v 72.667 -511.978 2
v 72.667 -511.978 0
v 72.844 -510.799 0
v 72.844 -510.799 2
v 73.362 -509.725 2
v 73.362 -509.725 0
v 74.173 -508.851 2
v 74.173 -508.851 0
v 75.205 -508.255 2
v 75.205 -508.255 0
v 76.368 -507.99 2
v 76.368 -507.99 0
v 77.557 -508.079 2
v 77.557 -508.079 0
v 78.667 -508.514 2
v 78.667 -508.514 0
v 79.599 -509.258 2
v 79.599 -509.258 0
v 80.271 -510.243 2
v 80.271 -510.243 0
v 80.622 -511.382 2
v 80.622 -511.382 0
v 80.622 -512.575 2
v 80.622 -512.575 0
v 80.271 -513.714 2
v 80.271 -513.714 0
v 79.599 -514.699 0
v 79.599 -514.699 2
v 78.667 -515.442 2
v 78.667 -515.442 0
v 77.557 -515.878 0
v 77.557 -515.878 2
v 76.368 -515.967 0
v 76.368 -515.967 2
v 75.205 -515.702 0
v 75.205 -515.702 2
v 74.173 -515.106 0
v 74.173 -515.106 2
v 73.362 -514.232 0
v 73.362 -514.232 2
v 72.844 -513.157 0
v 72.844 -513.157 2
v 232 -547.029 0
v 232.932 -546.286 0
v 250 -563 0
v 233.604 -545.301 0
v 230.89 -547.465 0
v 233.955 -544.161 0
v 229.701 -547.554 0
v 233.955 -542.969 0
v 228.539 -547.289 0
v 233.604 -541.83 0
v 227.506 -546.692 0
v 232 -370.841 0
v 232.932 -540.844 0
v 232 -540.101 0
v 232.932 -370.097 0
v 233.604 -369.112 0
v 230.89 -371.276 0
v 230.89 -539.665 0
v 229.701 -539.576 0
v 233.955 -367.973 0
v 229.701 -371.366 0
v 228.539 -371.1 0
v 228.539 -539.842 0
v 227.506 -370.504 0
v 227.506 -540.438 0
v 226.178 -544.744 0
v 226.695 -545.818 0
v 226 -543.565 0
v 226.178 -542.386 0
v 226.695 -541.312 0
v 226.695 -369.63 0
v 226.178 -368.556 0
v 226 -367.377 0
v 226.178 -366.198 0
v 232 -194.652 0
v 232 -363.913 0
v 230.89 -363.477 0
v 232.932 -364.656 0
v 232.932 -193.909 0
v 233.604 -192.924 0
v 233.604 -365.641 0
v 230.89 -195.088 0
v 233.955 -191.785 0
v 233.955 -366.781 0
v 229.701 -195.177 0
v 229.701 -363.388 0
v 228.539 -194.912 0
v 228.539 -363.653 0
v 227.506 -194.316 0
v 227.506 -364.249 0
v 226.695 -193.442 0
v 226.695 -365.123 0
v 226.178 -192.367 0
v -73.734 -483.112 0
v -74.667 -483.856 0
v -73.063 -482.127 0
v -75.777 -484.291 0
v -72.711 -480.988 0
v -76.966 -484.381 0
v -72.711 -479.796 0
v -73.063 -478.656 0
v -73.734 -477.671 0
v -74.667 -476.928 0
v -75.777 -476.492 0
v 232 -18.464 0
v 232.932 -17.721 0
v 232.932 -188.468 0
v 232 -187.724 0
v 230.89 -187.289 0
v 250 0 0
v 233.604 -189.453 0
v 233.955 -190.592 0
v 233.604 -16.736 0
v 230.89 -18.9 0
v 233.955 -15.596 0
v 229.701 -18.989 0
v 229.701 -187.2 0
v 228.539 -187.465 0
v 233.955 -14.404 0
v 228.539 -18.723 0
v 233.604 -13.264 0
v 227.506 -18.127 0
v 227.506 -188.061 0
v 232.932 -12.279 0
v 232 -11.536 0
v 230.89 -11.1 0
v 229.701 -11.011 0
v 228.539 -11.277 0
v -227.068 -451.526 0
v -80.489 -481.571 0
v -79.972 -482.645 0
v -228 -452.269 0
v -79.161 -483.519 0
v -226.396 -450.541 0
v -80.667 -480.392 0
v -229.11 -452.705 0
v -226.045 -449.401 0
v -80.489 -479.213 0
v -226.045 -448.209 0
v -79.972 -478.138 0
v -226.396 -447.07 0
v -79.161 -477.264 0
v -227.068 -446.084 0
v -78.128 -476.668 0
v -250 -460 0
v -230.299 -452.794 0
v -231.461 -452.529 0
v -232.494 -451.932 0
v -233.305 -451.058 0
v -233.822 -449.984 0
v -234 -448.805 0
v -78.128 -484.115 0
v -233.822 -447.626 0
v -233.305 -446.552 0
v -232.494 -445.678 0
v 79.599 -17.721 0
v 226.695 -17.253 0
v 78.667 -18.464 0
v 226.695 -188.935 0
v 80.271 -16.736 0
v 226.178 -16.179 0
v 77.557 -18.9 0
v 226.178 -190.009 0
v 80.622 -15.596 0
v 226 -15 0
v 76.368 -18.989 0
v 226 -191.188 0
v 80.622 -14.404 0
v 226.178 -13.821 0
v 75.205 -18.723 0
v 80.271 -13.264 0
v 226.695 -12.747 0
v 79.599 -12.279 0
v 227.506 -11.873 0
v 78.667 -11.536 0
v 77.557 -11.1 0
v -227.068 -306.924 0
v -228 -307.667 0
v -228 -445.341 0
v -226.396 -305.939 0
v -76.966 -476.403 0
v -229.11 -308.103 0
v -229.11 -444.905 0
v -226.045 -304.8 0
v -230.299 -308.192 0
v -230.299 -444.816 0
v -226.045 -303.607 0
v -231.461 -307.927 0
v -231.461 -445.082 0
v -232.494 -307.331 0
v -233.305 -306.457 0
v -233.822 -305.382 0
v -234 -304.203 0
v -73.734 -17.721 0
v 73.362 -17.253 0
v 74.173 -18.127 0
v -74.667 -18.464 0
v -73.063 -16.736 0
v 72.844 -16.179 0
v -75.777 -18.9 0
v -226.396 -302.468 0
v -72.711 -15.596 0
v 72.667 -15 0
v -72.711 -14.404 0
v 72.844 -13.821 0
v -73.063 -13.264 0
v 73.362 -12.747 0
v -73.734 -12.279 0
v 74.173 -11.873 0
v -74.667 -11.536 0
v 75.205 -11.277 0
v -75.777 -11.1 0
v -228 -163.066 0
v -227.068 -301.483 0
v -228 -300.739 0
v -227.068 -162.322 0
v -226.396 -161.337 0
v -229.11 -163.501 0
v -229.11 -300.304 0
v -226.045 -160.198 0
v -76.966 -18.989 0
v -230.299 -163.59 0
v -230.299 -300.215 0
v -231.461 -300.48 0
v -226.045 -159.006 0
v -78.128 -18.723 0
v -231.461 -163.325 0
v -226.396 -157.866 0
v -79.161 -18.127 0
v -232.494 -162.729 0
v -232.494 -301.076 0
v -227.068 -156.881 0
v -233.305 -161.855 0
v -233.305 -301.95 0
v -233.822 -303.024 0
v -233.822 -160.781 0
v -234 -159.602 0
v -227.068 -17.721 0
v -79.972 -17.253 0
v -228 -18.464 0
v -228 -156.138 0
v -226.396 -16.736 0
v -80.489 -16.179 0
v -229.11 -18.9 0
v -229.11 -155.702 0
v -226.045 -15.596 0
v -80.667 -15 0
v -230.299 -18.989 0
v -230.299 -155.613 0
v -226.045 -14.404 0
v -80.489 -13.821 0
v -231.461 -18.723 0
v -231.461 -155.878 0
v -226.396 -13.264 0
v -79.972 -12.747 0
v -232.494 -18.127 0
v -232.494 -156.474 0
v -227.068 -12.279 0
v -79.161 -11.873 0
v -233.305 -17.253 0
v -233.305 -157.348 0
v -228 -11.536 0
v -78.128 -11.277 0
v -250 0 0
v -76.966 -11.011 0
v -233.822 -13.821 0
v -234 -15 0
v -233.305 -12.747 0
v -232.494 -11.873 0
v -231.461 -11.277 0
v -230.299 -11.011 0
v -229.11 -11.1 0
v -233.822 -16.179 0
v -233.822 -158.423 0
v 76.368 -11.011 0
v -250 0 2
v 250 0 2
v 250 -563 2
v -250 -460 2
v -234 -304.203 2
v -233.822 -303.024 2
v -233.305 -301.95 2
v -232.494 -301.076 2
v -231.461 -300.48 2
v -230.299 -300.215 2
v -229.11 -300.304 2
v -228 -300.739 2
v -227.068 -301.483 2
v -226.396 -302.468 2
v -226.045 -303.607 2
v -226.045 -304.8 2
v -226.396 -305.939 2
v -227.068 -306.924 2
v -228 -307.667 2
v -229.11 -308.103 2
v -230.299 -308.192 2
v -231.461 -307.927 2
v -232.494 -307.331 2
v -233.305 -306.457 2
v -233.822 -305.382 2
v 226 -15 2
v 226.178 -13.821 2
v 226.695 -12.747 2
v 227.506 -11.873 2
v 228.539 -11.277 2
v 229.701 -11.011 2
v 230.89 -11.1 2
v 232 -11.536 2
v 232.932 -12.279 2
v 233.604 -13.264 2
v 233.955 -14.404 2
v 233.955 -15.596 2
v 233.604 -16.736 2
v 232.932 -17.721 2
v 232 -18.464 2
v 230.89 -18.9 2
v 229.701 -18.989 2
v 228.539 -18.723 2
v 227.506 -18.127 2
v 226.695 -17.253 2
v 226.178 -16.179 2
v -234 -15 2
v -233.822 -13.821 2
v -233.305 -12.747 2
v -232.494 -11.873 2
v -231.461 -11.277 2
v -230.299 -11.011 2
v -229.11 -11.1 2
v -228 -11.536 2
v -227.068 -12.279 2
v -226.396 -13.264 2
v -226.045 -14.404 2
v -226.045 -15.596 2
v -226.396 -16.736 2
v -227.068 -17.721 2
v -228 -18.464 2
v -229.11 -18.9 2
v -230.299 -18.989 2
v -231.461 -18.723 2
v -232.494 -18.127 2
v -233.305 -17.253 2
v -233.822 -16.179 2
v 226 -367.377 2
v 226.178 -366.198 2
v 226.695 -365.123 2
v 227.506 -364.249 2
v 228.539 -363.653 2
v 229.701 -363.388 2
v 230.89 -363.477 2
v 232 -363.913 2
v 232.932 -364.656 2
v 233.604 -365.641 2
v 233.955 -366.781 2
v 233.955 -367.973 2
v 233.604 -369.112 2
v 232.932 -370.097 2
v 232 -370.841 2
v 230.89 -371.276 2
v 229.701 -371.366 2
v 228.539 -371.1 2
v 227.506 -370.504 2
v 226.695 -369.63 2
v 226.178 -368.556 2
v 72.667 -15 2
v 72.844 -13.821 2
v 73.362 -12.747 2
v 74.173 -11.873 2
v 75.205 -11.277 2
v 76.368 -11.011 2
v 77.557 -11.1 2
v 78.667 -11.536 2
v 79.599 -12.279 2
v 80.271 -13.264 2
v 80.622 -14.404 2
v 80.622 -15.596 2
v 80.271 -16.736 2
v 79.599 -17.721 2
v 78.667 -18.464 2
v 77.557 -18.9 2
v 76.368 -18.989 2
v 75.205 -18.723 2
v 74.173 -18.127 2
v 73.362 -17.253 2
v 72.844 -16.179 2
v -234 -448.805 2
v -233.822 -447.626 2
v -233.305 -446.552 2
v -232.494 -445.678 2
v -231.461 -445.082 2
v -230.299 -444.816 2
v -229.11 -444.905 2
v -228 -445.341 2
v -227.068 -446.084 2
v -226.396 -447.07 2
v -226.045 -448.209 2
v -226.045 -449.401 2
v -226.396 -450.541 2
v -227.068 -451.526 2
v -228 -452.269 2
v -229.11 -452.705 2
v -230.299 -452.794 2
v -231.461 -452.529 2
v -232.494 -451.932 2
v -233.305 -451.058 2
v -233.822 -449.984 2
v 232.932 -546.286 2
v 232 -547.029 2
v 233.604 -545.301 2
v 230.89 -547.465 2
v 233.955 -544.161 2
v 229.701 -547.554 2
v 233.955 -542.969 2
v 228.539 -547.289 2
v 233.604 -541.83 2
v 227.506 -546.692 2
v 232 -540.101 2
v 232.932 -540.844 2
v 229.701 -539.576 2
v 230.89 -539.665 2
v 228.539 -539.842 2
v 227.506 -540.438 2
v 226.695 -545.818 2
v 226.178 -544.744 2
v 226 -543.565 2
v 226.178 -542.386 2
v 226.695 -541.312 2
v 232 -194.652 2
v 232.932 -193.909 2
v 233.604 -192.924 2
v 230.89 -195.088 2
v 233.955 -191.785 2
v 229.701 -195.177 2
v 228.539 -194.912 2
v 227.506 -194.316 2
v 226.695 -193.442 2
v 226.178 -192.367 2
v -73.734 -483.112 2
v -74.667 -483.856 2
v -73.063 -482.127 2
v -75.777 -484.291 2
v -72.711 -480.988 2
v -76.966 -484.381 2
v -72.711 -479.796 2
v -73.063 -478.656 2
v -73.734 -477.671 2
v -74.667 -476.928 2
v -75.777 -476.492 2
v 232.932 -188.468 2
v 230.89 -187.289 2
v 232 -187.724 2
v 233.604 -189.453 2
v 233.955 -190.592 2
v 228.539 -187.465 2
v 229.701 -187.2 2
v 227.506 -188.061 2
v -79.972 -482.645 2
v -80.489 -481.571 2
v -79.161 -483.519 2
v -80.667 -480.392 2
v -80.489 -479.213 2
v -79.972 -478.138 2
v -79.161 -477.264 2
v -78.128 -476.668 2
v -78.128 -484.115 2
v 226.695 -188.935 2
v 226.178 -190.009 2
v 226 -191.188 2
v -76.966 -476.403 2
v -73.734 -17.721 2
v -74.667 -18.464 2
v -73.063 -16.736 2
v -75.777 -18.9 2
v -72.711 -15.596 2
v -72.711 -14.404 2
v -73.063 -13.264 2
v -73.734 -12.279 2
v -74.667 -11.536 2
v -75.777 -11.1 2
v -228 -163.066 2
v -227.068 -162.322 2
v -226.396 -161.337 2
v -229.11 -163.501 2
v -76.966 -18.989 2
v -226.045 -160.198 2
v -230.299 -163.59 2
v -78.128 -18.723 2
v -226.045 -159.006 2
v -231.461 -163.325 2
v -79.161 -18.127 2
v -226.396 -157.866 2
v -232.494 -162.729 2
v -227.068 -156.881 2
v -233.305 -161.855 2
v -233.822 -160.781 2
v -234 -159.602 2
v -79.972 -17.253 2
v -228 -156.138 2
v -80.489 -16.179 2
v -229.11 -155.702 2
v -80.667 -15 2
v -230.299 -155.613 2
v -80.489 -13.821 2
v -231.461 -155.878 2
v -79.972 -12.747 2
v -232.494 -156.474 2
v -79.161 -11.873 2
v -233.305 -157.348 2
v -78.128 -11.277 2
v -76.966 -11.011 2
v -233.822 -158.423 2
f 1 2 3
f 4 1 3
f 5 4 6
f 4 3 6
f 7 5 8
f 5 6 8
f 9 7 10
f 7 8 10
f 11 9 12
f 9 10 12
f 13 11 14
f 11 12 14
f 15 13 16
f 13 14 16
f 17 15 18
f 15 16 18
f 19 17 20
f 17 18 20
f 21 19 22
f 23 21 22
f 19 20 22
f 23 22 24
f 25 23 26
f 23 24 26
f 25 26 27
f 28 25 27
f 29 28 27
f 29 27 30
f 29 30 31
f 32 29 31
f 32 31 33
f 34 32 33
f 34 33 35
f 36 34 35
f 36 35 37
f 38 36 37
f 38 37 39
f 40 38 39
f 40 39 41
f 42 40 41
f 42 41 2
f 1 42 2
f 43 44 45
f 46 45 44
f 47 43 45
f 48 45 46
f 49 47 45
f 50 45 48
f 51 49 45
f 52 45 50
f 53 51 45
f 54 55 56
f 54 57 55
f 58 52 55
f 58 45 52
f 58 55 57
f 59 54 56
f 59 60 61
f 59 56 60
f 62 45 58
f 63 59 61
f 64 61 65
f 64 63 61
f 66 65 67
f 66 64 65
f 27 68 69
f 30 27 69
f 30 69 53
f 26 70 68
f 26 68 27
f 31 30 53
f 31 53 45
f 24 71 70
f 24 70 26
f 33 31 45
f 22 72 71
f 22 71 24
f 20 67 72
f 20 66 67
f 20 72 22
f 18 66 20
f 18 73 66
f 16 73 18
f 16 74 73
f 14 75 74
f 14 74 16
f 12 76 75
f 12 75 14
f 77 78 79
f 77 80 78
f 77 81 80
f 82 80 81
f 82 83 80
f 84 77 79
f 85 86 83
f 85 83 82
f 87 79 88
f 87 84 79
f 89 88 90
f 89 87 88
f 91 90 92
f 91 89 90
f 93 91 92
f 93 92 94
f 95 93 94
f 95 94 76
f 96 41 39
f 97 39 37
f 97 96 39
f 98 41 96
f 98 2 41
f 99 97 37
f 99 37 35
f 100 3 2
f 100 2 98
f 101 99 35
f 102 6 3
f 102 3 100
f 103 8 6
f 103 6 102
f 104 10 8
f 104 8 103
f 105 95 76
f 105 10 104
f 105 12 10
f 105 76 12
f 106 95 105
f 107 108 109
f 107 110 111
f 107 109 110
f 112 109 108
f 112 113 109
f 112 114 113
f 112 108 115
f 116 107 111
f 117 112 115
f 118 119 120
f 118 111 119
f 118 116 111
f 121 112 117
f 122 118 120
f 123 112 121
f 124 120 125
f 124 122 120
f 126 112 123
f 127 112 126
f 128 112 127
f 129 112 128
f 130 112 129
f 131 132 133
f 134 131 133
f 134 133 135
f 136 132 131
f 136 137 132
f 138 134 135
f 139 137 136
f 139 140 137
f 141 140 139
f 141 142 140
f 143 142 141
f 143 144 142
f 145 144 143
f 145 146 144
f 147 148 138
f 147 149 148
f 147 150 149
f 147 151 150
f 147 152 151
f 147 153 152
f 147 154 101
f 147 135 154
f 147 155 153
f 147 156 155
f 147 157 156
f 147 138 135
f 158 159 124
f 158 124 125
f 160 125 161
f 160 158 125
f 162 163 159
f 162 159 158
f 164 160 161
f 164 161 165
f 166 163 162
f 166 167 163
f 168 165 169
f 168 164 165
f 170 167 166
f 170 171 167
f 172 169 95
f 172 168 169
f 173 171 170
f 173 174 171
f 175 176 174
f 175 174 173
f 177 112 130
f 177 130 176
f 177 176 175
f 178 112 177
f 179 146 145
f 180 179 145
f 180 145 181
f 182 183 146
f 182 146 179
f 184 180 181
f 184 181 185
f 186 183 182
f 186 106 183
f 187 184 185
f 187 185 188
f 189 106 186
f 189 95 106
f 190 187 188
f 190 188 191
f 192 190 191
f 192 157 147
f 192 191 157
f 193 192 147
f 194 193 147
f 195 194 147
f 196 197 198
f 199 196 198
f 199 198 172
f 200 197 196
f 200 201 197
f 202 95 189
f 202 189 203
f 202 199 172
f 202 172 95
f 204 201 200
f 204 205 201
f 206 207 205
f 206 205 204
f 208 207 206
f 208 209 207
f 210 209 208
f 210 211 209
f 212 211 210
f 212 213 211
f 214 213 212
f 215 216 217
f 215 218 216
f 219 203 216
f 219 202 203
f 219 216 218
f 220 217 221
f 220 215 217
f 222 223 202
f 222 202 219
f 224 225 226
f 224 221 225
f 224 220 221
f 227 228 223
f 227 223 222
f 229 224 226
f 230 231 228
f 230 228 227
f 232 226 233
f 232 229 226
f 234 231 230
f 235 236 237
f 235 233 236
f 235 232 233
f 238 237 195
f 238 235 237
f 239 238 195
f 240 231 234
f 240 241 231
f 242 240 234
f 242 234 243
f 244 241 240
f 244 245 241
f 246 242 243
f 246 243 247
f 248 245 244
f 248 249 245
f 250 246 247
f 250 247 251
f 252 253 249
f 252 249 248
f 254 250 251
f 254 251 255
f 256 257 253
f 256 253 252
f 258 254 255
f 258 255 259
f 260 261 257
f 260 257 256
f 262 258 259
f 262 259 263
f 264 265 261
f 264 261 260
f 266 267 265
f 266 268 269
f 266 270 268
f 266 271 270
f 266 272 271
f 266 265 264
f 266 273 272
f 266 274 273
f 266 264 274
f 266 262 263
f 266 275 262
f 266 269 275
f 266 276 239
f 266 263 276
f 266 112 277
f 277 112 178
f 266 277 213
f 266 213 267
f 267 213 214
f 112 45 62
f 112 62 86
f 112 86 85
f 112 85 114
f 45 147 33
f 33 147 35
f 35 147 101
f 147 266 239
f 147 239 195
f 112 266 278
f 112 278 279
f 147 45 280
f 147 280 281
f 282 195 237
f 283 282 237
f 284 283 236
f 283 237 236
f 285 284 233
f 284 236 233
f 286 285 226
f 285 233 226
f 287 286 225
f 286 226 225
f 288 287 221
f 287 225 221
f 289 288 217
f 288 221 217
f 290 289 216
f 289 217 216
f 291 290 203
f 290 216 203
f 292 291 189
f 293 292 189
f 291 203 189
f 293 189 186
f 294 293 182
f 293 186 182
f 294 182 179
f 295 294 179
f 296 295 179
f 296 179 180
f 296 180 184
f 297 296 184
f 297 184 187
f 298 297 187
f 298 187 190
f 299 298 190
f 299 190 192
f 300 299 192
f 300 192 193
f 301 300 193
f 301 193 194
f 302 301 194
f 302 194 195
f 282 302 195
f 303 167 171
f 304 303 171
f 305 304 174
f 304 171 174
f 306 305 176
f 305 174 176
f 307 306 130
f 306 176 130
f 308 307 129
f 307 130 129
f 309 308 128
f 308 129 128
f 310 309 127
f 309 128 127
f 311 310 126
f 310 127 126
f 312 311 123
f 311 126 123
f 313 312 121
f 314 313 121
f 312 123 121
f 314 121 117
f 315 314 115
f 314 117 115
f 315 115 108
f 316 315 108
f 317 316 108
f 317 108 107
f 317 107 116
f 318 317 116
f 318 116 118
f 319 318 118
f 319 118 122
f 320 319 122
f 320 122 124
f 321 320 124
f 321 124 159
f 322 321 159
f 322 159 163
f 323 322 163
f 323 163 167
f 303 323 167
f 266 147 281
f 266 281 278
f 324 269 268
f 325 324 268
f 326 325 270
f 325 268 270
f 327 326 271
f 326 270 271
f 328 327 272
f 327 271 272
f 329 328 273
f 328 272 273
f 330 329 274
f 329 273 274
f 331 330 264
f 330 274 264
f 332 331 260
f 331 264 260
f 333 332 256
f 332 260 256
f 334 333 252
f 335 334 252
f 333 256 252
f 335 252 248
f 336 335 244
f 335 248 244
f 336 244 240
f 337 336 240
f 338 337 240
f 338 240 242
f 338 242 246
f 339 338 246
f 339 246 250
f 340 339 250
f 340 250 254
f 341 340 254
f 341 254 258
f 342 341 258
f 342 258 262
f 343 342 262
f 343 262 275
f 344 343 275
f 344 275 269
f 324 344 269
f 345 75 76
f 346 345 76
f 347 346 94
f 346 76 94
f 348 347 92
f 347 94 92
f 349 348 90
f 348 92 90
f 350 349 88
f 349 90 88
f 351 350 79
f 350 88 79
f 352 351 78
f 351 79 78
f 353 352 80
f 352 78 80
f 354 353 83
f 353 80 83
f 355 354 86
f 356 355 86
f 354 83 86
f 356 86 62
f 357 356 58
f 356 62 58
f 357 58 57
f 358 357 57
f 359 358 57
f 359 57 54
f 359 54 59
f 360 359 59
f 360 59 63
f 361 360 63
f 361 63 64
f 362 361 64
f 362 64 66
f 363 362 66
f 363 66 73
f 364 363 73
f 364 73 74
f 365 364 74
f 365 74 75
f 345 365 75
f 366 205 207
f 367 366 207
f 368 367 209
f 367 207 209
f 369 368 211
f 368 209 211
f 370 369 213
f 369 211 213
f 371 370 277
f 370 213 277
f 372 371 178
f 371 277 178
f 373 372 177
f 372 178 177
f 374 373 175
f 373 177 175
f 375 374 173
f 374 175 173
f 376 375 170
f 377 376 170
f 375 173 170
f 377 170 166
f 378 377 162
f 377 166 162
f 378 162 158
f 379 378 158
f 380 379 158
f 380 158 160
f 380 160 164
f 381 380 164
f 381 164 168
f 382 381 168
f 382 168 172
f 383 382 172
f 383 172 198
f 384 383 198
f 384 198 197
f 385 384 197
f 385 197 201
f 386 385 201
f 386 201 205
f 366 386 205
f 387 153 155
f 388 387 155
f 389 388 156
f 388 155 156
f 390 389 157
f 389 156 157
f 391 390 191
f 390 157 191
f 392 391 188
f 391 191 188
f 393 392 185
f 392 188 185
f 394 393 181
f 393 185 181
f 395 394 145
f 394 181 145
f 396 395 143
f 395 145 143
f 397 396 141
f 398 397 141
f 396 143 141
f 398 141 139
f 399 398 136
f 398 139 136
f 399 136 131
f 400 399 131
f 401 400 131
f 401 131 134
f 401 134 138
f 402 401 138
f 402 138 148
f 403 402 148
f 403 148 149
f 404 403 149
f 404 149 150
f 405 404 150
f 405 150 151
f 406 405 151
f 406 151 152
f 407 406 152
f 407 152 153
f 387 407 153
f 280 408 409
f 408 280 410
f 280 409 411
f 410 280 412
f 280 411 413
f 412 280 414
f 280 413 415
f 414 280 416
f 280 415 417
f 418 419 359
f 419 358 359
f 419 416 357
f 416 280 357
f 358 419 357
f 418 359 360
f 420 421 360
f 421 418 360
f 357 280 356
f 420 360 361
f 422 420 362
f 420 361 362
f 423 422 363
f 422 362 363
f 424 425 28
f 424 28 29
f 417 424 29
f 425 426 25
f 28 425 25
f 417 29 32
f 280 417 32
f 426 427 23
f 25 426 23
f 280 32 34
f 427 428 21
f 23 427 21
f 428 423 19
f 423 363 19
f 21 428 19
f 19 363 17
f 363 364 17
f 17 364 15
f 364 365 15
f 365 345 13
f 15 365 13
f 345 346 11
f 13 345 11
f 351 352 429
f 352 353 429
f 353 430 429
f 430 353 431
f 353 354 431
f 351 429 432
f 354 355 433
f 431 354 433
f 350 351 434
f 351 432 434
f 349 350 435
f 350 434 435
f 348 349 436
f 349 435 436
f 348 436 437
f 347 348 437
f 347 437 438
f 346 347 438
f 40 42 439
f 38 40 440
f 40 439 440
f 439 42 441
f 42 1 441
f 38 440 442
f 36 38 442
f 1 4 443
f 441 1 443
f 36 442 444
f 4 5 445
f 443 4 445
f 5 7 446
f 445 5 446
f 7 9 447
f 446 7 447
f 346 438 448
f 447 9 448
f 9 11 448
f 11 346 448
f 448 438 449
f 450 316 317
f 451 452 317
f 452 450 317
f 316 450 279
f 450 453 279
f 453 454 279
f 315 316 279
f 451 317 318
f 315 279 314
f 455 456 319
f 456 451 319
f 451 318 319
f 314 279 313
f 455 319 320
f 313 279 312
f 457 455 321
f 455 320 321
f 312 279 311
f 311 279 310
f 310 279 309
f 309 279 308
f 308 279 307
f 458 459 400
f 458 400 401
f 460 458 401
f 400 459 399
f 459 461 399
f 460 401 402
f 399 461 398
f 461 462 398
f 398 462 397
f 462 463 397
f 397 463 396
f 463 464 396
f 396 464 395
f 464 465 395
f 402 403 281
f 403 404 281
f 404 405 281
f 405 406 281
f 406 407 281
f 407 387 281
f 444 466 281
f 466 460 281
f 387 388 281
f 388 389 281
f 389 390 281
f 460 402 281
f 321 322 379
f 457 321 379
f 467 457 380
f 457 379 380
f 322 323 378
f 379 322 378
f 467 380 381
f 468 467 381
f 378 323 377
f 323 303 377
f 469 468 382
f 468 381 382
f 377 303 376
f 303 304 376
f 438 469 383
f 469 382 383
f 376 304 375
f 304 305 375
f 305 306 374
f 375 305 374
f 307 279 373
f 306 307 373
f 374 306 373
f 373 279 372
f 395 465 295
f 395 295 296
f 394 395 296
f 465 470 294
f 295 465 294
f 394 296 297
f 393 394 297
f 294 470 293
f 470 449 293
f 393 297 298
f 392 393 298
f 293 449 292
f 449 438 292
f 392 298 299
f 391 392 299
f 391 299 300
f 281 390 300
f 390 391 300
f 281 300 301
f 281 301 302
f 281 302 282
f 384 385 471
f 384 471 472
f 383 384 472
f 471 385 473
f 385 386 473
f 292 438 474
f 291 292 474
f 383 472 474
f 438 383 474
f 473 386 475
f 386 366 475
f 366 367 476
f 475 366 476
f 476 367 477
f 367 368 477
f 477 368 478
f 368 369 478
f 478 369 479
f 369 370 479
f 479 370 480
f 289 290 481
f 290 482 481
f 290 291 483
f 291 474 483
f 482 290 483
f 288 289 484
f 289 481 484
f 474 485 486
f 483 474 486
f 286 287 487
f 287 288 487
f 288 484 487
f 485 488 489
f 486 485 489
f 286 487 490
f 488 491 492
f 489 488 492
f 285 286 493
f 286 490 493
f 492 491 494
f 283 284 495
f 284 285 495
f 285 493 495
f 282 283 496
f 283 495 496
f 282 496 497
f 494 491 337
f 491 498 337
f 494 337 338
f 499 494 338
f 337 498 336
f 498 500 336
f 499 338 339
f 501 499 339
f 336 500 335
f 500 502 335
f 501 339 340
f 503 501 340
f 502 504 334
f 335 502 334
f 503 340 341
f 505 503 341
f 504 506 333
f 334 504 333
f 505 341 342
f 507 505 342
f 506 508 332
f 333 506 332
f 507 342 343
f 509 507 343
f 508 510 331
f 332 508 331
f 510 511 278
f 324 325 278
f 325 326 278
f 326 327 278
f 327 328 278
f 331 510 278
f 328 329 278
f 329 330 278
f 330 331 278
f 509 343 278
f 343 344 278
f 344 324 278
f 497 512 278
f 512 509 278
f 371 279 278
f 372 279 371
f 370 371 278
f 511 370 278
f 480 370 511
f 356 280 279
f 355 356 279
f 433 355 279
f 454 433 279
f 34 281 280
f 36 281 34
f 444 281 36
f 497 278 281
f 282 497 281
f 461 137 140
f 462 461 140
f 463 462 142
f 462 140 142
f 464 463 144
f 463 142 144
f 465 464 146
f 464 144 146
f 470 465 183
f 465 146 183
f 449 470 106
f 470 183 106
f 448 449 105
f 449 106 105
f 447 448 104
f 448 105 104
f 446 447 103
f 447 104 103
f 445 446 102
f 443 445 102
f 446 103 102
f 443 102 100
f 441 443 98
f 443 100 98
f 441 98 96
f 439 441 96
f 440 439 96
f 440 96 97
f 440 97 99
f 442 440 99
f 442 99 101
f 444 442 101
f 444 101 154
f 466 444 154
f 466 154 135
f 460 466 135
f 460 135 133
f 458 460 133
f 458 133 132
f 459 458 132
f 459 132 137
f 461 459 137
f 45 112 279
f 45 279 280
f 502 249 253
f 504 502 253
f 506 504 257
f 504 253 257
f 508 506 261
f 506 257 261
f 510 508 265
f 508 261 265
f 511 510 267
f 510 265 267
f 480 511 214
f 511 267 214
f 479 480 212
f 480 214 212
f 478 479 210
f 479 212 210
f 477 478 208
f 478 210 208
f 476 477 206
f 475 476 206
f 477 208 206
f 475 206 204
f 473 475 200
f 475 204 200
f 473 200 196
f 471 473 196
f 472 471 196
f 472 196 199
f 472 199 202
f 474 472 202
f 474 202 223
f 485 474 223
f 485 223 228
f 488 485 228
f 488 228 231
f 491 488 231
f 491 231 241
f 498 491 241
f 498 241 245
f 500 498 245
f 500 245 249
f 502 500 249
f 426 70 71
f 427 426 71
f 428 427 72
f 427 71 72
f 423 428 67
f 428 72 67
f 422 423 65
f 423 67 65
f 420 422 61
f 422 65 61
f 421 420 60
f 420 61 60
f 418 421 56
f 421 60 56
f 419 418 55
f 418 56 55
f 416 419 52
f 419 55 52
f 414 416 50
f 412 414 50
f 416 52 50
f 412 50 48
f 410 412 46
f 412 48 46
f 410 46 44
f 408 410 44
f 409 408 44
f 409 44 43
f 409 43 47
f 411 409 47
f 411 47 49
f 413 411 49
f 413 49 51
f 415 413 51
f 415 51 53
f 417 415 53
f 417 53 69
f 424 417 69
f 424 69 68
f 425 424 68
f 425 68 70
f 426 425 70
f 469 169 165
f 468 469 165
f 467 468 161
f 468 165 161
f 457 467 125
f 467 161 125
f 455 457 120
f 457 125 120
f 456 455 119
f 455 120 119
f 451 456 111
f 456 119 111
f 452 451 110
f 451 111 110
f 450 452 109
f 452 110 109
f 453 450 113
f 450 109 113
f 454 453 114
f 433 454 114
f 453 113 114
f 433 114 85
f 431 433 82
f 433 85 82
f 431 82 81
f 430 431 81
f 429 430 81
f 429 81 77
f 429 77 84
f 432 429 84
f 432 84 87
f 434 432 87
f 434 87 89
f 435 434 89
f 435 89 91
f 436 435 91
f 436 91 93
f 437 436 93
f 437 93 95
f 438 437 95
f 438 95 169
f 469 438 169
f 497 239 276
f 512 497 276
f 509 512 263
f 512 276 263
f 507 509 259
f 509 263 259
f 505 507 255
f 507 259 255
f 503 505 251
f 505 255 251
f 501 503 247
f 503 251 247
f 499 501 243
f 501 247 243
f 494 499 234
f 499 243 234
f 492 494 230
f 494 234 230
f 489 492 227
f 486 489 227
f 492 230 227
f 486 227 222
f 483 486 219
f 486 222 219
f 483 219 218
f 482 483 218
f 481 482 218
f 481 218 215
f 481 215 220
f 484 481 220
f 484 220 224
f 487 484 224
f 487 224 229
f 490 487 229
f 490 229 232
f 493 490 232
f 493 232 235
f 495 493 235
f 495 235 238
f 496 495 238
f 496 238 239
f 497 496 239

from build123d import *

# Parameters (mm, degrees)
BOSS_EXTRU_1_DEPTH      = 2
ESQUISSE3_R             = 4
ENL_V_MAT_EXTRU_1_DEPTH = 10


with BuildPart() as part:
    # Esquisse1 → Boss.-Extru.1 (new body)
    with BuildSketch(Plane.XY):
        Polygon((-250, 0), (250, 0), (250, -563), (-250, -460), align=None)
    extrude(amount=BOSS_EXTRU_1_DEPTH)

    # Esquisse3 → Enlèv. mat.-Extru.1 (cut)
    with BuildSketch(Plane(origin=(0, 0, 0), x_dir=(-1, 0, 0), z_dir=(0, 0, -1))):
        with Locations((-230, -15)):
            Circle(ESQUISSE3_R)
        with Locations((-76.666666667, -15)):
            Circle(ESQUISSE3_R)
        with Locations((76.666666667, -15)):
            Circle(ESQUISSE3_R)
        with Locations((230, -15)):
            Circle(ESQUISSE3_R)
        with Locations((230, -159.60167891)):
            Circle(ESQUISSE3_R)
        with Locations((230, -304.203357819)):
            Circle(ESQUISSE3_R)
        with Locations((76.666666667, -480.391703395)):
            Circle(ESQUISSE3_R)
        with Locations((-76.666666667, -511.978370062)):
            Circle(ESQUISSE3_R)
        with Locations((-230, -543.565036729)):
            Circle(ESQUISSE3_R)
        with Locations((-230, -367.376691152)):
            Circle(ESQUISSE3_R)
        with Locations((-230, -191.188345576)):
            Circle(ESQUISSE3_R)
        with Locations((230, -448.805036729)):
            Circle(ESQUISSE3_R)
    extrude(amount=-ENL_V_MAT_EXTRU_1_DEPTH, mode=Mode.SUBTRACT)


solid = part.part
